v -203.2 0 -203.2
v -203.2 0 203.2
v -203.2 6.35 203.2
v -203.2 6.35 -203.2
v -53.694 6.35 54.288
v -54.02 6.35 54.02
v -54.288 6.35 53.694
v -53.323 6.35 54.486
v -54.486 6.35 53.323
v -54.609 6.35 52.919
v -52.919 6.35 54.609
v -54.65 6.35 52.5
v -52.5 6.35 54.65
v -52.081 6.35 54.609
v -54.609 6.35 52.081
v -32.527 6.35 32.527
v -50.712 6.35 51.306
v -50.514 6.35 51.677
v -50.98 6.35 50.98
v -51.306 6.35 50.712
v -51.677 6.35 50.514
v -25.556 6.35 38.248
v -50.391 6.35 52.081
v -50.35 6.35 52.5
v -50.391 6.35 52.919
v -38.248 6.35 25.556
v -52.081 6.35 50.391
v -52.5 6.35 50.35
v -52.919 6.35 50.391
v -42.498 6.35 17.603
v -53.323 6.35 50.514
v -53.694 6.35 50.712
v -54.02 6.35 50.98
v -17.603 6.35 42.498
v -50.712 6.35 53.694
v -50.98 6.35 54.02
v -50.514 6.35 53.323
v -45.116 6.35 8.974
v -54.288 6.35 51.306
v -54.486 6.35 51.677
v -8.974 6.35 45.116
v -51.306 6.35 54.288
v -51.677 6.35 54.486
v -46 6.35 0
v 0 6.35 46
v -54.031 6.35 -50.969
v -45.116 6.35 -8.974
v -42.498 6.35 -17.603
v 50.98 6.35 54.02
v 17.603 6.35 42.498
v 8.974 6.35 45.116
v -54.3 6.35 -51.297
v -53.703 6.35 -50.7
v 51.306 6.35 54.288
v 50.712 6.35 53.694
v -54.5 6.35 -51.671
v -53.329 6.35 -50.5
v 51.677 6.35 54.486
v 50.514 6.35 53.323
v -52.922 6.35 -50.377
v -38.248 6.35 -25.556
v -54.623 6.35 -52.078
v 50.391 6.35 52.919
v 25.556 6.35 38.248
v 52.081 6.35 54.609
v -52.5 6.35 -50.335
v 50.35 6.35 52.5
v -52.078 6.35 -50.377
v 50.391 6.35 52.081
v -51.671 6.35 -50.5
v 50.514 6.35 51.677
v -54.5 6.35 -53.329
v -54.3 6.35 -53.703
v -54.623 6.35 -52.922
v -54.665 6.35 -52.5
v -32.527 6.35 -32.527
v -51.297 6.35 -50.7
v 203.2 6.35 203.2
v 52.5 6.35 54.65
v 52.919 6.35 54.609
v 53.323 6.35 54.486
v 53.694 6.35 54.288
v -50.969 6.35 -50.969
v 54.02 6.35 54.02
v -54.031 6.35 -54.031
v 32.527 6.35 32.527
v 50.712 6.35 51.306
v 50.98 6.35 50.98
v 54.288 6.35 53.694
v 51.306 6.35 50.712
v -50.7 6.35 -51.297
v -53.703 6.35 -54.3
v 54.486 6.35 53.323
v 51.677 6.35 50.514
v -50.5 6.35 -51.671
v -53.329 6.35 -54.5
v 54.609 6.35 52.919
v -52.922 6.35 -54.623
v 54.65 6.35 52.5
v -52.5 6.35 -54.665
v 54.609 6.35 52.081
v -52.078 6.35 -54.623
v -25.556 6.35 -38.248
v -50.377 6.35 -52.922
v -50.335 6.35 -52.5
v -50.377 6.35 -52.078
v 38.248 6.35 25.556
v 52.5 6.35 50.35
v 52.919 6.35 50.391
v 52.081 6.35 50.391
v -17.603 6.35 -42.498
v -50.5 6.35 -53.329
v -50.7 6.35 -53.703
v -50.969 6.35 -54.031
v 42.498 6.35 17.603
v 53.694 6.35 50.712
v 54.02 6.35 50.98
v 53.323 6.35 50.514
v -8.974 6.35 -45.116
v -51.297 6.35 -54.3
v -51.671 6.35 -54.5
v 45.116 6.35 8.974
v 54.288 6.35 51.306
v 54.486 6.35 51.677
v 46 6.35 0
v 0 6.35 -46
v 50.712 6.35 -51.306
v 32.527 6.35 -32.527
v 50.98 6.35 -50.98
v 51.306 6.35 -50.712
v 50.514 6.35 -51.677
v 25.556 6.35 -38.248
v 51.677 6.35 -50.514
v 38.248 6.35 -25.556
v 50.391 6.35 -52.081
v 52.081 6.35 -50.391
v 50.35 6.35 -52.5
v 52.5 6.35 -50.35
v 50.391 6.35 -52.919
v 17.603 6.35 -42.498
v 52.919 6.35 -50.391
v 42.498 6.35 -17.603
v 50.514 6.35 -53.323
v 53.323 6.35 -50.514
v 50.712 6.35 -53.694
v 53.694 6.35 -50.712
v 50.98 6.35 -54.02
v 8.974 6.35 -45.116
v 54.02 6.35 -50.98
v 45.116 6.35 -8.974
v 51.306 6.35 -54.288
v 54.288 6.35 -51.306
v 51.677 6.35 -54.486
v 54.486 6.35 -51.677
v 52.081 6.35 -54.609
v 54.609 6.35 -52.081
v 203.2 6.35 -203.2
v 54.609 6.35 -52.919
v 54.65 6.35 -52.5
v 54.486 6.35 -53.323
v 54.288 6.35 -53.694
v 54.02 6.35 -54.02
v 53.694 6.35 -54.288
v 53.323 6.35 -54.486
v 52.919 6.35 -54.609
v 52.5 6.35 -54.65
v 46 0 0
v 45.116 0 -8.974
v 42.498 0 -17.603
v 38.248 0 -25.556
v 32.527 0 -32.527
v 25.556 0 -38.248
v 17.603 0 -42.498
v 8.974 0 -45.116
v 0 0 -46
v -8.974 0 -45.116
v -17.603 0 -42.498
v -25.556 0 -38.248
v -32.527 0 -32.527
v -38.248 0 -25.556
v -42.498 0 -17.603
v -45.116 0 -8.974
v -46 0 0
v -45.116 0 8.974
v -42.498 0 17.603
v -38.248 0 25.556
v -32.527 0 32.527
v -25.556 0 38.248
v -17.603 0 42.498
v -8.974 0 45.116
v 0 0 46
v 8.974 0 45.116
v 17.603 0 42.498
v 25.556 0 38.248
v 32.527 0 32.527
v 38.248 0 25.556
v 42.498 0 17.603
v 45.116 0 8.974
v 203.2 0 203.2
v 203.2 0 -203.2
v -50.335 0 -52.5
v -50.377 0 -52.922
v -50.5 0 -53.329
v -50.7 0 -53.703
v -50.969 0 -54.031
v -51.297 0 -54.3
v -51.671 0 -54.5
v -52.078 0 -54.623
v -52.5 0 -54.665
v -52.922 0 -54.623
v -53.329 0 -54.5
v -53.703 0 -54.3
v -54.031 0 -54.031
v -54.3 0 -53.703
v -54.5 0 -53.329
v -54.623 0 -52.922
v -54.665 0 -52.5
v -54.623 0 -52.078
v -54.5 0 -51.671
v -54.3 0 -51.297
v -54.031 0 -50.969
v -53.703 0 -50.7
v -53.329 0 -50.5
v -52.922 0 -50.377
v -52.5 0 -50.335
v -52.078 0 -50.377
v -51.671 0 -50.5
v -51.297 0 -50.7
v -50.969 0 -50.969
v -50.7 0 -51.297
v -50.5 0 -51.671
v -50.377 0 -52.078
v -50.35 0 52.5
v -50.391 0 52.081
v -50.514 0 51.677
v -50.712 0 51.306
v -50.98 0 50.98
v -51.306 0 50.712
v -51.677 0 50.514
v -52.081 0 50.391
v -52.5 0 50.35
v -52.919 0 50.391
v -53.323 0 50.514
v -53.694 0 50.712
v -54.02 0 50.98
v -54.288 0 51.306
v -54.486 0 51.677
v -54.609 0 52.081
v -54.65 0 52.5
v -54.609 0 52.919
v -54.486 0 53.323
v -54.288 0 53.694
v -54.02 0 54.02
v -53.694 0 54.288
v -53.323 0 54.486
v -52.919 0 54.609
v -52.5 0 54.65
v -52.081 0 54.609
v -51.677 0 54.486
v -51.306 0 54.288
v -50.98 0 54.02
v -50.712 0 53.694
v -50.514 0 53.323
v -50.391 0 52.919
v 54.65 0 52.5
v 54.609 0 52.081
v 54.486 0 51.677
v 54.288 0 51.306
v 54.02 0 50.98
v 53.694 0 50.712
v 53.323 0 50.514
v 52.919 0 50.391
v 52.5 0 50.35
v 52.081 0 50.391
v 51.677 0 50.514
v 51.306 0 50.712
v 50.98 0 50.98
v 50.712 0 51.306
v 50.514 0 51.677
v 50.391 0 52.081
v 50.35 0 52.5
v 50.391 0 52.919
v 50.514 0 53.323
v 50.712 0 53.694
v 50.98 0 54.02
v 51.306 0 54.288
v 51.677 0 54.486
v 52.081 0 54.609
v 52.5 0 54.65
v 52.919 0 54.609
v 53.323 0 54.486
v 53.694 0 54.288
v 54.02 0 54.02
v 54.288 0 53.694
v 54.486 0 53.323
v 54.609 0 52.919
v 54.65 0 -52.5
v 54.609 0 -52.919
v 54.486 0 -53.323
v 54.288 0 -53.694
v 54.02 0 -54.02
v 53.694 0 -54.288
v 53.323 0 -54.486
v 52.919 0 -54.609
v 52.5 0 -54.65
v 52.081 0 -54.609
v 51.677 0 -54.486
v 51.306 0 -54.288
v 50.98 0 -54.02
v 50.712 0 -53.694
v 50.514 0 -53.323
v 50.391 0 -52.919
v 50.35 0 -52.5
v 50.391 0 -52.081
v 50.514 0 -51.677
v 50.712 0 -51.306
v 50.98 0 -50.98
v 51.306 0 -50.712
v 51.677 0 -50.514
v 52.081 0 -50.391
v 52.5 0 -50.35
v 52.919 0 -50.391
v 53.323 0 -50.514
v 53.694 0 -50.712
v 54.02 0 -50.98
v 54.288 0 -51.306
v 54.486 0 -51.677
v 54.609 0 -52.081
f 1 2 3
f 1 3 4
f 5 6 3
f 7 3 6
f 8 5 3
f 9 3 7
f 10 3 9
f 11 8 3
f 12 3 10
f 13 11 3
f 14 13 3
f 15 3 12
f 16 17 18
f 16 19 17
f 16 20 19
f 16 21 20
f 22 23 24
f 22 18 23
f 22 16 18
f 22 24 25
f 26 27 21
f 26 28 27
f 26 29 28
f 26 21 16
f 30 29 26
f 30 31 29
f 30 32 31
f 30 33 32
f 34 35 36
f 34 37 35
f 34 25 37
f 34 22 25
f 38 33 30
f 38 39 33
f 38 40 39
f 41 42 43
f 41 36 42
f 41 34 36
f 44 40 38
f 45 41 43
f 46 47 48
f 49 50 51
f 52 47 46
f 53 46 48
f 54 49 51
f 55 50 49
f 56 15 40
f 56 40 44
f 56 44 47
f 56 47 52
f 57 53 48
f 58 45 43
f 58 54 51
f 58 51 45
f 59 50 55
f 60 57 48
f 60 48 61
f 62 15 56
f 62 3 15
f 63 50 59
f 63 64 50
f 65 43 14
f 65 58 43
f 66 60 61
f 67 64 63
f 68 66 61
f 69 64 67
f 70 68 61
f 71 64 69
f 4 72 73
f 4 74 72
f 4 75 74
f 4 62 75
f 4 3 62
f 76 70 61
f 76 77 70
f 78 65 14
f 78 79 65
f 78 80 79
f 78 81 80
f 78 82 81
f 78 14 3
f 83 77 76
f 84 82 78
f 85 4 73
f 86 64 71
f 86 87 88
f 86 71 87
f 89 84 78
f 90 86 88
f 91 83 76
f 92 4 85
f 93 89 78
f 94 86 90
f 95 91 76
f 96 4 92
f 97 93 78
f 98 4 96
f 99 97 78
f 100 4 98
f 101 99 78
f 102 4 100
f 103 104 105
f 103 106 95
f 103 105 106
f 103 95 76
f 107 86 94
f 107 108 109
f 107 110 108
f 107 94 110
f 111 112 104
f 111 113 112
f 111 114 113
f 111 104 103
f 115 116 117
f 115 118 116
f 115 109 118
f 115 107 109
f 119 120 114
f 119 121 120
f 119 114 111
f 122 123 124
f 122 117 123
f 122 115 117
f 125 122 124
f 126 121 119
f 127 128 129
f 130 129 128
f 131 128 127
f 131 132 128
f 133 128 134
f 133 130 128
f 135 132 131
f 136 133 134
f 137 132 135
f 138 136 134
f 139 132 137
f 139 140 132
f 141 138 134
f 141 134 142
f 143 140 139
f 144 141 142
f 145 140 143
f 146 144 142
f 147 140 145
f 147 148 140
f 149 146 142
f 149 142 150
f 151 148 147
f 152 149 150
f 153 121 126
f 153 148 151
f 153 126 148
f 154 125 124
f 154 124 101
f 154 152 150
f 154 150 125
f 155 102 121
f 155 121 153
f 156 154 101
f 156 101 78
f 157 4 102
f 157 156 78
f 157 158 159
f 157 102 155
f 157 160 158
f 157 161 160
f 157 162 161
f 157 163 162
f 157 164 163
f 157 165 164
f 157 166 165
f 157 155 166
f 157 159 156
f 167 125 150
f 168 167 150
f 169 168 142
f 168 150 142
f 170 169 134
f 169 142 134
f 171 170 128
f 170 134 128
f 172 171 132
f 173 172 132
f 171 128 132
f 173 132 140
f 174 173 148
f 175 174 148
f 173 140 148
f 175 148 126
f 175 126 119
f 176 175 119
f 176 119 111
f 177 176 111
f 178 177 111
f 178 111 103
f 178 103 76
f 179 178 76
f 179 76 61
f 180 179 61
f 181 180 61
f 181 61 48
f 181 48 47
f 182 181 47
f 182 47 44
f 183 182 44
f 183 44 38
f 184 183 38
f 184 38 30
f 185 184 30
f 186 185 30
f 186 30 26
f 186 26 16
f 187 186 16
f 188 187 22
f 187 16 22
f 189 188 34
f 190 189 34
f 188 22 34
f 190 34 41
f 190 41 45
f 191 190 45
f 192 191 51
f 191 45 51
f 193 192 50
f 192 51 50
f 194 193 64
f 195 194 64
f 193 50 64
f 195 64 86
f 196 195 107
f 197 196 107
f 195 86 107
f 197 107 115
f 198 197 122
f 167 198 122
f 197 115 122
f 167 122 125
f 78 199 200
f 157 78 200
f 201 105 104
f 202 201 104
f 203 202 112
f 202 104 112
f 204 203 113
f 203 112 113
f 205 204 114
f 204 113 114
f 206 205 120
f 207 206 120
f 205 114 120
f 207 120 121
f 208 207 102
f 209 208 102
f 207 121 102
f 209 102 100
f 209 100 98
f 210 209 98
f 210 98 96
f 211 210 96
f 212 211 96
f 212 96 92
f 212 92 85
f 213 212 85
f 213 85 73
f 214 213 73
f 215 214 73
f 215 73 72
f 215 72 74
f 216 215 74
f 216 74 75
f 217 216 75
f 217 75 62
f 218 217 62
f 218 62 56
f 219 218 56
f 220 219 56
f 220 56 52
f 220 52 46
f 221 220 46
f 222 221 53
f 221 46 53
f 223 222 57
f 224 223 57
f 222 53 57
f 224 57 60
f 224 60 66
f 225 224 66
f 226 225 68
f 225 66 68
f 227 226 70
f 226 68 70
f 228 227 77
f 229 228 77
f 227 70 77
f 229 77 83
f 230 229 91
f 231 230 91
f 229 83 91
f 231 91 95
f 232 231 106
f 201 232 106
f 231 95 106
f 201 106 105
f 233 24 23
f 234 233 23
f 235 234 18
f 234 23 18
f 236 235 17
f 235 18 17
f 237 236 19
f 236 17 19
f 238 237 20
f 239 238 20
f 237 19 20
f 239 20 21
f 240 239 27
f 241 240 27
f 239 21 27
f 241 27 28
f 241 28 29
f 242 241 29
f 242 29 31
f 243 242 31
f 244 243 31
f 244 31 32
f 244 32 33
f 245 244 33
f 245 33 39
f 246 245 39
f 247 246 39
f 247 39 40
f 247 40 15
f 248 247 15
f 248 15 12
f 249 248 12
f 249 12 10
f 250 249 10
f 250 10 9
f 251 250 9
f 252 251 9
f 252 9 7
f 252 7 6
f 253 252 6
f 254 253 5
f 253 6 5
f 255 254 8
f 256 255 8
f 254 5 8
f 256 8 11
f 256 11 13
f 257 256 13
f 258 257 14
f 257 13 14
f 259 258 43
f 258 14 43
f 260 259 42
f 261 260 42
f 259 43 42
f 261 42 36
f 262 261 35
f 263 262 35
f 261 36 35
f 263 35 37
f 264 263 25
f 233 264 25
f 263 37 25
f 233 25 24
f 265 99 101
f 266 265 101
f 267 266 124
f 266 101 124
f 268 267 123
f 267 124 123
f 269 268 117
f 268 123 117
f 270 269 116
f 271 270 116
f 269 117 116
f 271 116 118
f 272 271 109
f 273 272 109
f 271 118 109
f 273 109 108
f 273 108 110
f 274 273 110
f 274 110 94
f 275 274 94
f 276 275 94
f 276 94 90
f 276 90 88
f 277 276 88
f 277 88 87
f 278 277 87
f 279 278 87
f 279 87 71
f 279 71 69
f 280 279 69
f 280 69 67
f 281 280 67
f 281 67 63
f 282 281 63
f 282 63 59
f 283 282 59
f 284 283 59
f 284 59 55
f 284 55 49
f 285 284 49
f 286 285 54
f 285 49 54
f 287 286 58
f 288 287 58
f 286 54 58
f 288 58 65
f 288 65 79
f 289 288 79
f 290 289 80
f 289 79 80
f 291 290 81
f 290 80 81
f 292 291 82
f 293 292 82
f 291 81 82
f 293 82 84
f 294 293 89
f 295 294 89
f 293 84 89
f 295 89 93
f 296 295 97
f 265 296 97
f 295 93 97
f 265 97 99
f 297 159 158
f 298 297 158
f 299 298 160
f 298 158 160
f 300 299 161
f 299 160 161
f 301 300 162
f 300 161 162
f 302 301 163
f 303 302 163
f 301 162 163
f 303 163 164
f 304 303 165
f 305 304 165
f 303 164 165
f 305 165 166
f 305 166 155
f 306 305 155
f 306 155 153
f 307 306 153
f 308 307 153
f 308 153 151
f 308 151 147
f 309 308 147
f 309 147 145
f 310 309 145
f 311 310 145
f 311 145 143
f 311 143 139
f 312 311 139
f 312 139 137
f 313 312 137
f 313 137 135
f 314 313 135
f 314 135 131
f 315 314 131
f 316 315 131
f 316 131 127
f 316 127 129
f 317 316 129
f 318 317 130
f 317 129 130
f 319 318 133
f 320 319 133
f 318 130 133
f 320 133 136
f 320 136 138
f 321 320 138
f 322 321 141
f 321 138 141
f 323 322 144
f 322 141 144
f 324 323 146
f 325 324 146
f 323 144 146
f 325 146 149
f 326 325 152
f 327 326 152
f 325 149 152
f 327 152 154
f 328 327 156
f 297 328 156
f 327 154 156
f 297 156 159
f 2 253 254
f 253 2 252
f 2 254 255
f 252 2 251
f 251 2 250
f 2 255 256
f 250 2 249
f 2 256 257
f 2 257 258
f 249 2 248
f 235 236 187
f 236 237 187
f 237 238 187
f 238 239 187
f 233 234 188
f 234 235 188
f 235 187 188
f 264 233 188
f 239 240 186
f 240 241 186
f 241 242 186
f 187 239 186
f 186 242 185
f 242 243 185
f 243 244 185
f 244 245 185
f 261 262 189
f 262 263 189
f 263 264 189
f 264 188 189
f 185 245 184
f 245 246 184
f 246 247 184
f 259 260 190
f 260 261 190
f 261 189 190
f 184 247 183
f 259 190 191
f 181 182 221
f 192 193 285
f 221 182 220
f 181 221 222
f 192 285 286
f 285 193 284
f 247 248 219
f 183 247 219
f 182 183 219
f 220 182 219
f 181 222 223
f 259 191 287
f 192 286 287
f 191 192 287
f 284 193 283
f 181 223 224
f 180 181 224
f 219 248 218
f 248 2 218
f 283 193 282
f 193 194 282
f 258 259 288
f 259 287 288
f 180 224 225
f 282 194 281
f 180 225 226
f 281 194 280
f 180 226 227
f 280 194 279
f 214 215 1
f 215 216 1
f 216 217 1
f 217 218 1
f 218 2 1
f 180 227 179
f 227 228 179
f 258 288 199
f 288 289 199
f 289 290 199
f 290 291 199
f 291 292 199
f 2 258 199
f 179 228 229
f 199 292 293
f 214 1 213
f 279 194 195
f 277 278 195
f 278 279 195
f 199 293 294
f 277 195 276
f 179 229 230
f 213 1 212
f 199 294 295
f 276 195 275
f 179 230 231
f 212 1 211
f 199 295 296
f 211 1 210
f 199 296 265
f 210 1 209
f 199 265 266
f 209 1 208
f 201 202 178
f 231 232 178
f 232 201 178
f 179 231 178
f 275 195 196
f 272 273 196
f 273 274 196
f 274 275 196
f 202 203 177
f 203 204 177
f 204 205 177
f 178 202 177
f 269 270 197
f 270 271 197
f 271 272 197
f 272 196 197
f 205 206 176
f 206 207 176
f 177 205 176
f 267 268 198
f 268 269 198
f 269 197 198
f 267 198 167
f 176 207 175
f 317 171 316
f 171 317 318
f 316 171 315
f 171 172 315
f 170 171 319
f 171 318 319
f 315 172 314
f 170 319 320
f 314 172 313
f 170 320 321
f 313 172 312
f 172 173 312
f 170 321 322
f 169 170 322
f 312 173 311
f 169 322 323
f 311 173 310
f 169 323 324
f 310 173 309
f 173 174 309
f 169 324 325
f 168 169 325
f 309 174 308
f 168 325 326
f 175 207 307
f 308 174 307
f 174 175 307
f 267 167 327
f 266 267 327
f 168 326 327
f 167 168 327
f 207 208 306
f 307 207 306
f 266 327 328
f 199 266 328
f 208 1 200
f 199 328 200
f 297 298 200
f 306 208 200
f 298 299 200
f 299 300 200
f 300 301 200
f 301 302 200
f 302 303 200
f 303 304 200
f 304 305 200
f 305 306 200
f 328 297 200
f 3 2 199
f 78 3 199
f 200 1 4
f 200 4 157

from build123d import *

# Parameters (mm, degrees)
SKETCH1_W           = 406.4
SKETCH1_H           = 406.4
BOSS_EXTRUDE1_DEPTH = 6.35
CUT_EXTRUDE1_REACH  = 8.35
SKETCH2_R           = 46
SKETCH2_R_2         = 2.15
SKETCH2_R_3         = 2.165


with BuildPart() as part:
    # Sketch1 → Boss-Extrude1 (new body)
    with BuildSketch(Plane(origin=(0, 0, 0), x_dir=(1, 0, 0), z_dir=(0, 1, 0))):
        Rectangle(SKETCH1_W, SKETCH1_H)
    extrude(amount=BOSS_EXTRUDE1_DEPTH)

    # Sketch2 → Cut-Extrude1 (cut, up to next)
    with BuildSketch(Plane(origin=(0, 6.35, 0), x_dir=(1, 0, 0), z_dir=(0, 1, 0)), mode=Mode.PRIVATE) as cut_extrude1_sk1:
        Circle(SKETCH2_R)
    cut_extrude1_tool1 = extrude(cut_extrude1_sk1.sketch, amount=-CUT_EXTRUDE1_REACH, mode=Mode.PRIVATE) & part.part
    add(cut_extrude1_tool1.solids().sort_by_distance((0, 6.35, 0))[0], mode=Mode.SUBTRACT)
    # Sketch2 → Cut-Extrude1 (cut, up to next)
    with BuildSketch(Plane(origin=(0, 6.35, 0), x_dir=(1, 0, 0), z_dir=(0, 1, 0)), mode=Mode.PRIVATE) as cut_extrude1_sk2:
        with Locations((52.5, 52.5)):
            Circle(SKETCH2_R_2)
    cut_extrude1_tool2 = extrude(cut_extrude1_sk2.sketch, amount=-CUT_EXTRUDE1_REACH, mode=Mode.PRIVATE) & part.part
    add(cut_extrude1_tool2.solids().sort_by_distance((52.5, 6.35, -52.5))[0], mode=Mode.SUBTRACT)
    # Sketch2 → Cut-Extrude1 (cut, up to next)
    with BuildSketch(Plane(origin=(0, 6.35, 0), x_dir=(1, 0, 0), z_dir=(0, 1, 0)), mode=Mode.PRIVATE) as cut_extrude1_sk3:
        with Locations((52.5, -52.5)):
            Circle(SKETCH2_R_2)
    cut_extrude1_tool3 = extrude(cut_extrude1_sk3.sketch, amount=-CUT_EXTRUDE1_REACH, mode=Mode.PRIVATE) & part.part
    add(cut_extrude1_tool3.solids().sort_by_distance((52.5, 6.35, 52.5))[0], mode=Mode.SUBTRACT)
    # Sketch2 → Cut-Extrude1 (cut, up to next)
    with BuildSketch(Plane(origin=(0, 6.35, 0), x_dir=(1, 0, 0), z_dir=(0, 1, 0)), mode=Mode.PRIVATE) as cut_extrude1_sk4:
        with Locations((-52.5, -52.5)):
            Circle(SKETCH2_R_2)
    cut_extrude1_tool4 = extrude(cut_extrude1_sk4.sketch, amount=-CUT_EXTRUDE1_REACH, mode=Mode.PRIVATE) & part.part
    add(cut_extrude1_tool4.solids().sort_by_distance((-52.5, 6.35, 52.5))[0], mode=Mode.SUBTRACT)
    # Sketch2 → Cut-Extrude1 (cut, up to next)
    with BuildSketch(Plane(origin=(0, 6.35, 0), x_dir=(1, 0, 0), z_dir=(0, 1, 0)), mode=Mode.PRIVATE) as cut_extrude1_sk5:
        with Locations((-52.5, 52.5)):
            Circle(SKETCH2_R_3)
    cut_extrude1_tool5 = extrude(cut_extrude1_sk5.sketch, amount=-CUT_EXTRUDE1_REACH, mode=Mode.PRIVATE) & part.part
    add(cut_extrude1_tool5.solids().sort_by_distance((-52.5, 6.35, -52.5))[0], mode=Mode.SUBTRACT)


solid = part.part
